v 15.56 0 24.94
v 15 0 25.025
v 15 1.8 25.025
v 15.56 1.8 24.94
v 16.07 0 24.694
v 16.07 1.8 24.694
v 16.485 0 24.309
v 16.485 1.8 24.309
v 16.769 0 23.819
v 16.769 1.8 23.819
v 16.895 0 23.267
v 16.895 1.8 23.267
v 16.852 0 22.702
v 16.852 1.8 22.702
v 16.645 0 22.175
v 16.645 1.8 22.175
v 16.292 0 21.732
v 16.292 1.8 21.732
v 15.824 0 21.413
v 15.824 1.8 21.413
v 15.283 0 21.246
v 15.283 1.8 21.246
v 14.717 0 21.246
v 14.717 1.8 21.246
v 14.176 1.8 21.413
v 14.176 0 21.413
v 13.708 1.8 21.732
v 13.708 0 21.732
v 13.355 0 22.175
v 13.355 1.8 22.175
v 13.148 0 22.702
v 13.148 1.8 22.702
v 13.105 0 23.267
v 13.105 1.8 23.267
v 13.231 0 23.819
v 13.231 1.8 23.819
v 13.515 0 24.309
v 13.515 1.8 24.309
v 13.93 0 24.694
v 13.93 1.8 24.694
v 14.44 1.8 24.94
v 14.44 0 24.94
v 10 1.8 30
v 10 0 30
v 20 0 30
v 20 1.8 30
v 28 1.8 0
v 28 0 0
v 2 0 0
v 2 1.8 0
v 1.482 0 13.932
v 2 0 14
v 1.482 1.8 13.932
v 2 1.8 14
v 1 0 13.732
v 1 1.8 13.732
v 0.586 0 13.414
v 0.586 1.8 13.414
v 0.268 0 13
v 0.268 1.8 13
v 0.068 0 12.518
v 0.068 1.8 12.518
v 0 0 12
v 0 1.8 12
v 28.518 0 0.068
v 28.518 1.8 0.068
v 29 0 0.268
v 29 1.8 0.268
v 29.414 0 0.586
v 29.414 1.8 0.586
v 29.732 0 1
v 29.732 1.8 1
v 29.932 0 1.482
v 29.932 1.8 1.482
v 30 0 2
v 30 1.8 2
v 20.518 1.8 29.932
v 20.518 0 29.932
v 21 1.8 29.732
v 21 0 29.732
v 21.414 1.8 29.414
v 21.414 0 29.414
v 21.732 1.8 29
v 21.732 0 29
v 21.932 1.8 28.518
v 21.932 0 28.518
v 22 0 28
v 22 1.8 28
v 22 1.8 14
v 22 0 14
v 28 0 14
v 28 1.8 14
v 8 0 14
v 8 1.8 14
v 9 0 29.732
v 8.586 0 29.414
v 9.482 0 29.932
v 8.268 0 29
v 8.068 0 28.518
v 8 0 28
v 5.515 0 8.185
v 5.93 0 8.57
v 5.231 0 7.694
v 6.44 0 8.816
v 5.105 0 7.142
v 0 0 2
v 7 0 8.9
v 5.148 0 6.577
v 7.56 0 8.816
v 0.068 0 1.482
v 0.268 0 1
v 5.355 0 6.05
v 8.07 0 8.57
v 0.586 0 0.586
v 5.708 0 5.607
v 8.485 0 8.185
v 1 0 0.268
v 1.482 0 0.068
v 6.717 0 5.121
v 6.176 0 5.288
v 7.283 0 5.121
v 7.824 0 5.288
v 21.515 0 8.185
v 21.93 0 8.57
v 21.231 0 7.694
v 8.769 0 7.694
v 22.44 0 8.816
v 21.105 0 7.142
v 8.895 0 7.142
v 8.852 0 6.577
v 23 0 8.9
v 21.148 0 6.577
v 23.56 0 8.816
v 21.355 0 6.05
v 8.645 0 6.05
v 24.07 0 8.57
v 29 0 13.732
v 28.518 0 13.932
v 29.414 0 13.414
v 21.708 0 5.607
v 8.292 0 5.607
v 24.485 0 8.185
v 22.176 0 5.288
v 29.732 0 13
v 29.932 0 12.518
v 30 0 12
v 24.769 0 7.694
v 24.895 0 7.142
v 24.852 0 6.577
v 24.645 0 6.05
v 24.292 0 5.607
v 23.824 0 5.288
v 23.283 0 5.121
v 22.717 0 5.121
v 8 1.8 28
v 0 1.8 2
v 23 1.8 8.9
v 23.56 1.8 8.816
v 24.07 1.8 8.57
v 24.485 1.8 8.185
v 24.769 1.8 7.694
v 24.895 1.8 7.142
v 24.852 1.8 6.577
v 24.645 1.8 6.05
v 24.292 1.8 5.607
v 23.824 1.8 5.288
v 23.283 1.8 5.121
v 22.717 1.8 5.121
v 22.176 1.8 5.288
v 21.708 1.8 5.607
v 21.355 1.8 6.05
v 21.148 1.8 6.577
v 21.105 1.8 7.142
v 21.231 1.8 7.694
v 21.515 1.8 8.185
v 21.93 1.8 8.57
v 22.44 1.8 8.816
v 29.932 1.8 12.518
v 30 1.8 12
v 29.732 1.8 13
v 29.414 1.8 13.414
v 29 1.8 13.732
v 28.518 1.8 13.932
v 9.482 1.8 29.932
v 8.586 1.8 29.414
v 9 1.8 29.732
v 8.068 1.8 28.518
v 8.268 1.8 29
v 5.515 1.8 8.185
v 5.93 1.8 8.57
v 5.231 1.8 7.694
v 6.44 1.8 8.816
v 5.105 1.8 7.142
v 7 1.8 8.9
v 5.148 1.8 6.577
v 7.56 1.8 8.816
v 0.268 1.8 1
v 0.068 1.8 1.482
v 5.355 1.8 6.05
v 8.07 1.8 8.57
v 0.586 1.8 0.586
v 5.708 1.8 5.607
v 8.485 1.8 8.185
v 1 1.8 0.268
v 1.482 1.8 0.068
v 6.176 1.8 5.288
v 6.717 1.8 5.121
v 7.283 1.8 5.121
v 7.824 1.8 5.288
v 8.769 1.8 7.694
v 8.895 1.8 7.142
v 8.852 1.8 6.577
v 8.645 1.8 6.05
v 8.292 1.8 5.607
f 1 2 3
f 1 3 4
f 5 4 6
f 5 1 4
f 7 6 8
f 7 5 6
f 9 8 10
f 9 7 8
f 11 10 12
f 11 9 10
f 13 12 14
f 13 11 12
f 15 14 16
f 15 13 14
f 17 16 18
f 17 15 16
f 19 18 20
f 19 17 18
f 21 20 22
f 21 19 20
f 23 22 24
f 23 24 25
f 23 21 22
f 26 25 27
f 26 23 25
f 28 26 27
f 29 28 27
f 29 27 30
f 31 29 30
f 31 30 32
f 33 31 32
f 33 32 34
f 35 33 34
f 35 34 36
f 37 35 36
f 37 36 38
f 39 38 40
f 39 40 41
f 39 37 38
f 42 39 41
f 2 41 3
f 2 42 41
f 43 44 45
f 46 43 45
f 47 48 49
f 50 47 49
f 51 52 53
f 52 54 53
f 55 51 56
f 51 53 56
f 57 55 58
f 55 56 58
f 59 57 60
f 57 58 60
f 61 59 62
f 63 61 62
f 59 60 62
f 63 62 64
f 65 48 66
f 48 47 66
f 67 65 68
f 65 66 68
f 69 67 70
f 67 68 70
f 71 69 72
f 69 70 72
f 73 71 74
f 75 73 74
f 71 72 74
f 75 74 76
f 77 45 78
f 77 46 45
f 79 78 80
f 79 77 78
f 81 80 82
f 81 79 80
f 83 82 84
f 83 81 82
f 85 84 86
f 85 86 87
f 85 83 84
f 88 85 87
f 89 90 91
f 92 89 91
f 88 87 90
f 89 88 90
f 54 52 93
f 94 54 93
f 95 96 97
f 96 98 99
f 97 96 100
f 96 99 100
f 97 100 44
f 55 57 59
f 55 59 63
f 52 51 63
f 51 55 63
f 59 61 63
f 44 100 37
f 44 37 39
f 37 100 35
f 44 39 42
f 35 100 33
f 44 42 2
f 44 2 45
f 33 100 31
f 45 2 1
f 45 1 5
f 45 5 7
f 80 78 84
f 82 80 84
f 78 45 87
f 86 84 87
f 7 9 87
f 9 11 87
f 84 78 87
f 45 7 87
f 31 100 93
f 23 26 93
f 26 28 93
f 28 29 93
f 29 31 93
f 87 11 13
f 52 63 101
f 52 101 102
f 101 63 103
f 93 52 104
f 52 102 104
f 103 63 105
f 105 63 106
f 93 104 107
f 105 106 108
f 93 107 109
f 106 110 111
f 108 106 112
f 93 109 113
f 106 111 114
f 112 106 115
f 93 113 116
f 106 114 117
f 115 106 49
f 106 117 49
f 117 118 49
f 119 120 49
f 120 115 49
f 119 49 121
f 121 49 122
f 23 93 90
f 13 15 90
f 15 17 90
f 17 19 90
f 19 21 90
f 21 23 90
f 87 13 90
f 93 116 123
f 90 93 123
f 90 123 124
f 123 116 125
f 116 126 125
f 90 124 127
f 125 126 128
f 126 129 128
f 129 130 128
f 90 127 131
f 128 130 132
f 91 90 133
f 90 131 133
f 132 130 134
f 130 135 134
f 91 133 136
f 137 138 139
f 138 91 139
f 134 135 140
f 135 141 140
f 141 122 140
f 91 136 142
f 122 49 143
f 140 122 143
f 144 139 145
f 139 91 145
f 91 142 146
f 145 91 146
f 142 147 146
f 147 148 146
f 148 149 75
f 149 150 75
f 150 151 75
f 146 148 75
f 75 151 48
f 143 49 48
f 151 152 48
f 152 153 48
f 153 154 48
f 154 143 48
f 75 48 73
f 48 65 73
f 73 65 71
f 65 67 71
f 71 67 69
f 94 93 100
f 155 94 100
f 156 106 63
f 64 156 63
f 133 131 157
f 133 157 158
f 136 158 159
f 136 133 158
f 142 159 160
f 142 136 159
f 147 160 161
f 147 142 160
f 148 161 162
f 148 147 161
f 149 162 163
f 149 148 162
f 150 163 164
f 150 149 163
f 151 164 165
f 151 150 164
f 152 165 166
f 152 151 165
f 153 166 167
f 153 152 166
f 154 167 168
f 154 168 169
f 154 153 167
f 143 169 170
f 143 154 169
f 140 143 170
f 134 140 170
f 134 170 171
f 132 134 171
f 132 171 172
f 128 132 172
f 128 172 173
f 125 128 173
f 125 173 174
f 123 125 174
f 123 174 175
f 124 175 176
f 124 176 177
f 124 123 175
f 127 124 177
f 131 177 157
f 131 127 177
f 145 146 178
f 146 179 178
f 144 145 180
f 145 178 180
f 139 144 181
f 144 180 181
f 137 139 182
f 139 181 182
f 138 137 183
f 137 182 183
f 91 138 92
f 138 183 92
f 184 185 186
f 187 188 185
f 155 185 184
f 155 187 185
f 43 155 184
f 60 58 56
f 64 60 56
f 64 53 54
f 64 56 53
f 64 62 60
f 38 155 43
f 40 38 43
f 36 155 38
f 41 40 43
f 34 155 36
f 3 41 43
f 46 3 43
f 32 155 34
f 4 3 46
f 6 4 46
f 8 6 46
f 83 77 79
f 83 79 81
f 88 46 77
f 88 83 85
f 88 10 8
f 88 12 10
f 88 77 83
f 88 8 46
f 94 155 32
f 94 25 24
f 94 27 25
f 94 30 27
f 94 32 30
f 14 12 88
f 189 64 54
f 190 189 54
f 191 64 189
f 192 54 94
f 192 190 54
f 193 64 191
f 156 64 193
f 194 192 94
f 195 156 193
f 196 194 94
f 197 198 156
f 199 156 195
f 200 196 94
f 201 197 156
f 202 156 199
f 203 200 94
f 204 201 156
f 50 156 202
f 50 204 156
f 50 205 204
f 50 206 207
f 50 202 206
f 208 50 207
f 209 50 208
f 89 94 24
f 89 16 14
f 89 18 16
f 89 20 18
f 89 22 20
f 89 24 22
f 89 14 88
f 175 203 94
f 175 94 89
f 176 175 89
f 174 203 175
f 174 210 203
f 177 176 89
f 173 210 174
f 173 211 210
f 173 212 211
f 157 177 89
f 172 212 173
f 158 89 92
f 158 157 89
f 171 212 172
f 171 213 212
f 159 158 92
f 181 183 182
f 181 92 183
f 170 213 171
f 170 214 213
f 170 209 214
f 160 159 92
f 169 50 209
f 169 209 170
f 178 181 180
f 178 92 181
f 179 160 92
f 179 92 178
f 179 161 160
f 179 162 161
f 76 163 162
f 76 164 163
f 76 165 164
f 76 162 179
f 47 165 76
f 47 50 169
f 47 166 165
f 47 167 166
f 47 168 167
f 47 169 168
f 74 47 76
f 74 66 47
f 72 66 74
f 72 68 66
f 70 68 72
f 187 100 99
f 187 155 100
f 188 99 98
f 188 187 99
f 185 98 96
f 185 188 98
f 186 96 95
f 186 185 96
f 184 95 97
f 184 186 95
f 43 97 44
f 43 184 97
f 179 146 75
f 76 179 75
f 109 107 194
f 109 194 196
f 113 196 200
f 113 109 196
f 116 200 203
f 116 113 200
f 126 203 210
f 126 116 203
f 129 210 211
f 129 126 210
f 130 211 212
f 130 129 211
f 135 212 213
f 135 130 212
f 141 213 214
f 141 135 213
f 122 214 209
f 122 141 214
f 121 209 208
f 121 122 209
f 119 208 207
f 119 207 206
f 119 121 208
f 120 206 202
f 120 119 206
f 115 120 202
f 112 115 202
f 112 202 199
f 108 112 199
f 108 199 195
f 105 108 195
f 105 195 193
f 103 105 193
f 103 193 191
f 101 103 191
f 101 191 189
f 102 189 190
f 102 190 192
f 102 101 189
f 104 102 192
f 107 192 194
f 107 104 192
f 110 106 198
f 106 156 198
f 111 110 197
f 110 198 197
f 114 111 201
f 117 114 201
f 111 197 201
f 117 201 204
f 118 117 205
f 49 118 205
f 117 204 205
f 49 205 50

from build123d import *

# Parameters (mm, degrees)
SKETCH_1_R      = 1.9
EXTRUDE_1_DEPTH = 1.8
FILLET_1_R      = 2


with BuildPart() as part:
    # 草图1 → 凸台-拉伸1 (new body)
    with BuildSketch(Plane(origin=(0, 0, 0), x_dir=(1, 0, 0), z_dir=(0, 1, 0))):
        Polygon((0, -14), (8, -14), (8, -30), (22, -30), (22, -14), (30, -14), (30, 0), (0, 0), align=None)
        with Locations(Location((7, -7, 0), (0, 0, 270))):
            Circle(SKETCH_1_R, mode=Mode.SUBTRACT)
        with Locations(Location((23, -7, 0), (0, 0, 270))):
            Circle(SKETCH_1_R, mode=Mode.SUBTRACT)
        with Locations(Location((15, -23.124515497, 0), (0, 0, 270))):
            Circle(SKETCH_1_R, mode=Mode.SUBTRACT)
    extrude(amount=EXTRUDE_1_DEPTH)

    # 圆角1
    fillet_1_edges = [part.edges().sort_by_distance(p)[0] for p in [
        (0, 0.9, 0),
        (30, 0.9, 0),
        (30, 0.9, 14),
        (22, 0.9, 30),
        (8, 0.9, 30),
        (0, 0.9, 14),
    ]]
    fillet(fillet_1_edges, radius=FILLET_1_R)


solid = part.part
